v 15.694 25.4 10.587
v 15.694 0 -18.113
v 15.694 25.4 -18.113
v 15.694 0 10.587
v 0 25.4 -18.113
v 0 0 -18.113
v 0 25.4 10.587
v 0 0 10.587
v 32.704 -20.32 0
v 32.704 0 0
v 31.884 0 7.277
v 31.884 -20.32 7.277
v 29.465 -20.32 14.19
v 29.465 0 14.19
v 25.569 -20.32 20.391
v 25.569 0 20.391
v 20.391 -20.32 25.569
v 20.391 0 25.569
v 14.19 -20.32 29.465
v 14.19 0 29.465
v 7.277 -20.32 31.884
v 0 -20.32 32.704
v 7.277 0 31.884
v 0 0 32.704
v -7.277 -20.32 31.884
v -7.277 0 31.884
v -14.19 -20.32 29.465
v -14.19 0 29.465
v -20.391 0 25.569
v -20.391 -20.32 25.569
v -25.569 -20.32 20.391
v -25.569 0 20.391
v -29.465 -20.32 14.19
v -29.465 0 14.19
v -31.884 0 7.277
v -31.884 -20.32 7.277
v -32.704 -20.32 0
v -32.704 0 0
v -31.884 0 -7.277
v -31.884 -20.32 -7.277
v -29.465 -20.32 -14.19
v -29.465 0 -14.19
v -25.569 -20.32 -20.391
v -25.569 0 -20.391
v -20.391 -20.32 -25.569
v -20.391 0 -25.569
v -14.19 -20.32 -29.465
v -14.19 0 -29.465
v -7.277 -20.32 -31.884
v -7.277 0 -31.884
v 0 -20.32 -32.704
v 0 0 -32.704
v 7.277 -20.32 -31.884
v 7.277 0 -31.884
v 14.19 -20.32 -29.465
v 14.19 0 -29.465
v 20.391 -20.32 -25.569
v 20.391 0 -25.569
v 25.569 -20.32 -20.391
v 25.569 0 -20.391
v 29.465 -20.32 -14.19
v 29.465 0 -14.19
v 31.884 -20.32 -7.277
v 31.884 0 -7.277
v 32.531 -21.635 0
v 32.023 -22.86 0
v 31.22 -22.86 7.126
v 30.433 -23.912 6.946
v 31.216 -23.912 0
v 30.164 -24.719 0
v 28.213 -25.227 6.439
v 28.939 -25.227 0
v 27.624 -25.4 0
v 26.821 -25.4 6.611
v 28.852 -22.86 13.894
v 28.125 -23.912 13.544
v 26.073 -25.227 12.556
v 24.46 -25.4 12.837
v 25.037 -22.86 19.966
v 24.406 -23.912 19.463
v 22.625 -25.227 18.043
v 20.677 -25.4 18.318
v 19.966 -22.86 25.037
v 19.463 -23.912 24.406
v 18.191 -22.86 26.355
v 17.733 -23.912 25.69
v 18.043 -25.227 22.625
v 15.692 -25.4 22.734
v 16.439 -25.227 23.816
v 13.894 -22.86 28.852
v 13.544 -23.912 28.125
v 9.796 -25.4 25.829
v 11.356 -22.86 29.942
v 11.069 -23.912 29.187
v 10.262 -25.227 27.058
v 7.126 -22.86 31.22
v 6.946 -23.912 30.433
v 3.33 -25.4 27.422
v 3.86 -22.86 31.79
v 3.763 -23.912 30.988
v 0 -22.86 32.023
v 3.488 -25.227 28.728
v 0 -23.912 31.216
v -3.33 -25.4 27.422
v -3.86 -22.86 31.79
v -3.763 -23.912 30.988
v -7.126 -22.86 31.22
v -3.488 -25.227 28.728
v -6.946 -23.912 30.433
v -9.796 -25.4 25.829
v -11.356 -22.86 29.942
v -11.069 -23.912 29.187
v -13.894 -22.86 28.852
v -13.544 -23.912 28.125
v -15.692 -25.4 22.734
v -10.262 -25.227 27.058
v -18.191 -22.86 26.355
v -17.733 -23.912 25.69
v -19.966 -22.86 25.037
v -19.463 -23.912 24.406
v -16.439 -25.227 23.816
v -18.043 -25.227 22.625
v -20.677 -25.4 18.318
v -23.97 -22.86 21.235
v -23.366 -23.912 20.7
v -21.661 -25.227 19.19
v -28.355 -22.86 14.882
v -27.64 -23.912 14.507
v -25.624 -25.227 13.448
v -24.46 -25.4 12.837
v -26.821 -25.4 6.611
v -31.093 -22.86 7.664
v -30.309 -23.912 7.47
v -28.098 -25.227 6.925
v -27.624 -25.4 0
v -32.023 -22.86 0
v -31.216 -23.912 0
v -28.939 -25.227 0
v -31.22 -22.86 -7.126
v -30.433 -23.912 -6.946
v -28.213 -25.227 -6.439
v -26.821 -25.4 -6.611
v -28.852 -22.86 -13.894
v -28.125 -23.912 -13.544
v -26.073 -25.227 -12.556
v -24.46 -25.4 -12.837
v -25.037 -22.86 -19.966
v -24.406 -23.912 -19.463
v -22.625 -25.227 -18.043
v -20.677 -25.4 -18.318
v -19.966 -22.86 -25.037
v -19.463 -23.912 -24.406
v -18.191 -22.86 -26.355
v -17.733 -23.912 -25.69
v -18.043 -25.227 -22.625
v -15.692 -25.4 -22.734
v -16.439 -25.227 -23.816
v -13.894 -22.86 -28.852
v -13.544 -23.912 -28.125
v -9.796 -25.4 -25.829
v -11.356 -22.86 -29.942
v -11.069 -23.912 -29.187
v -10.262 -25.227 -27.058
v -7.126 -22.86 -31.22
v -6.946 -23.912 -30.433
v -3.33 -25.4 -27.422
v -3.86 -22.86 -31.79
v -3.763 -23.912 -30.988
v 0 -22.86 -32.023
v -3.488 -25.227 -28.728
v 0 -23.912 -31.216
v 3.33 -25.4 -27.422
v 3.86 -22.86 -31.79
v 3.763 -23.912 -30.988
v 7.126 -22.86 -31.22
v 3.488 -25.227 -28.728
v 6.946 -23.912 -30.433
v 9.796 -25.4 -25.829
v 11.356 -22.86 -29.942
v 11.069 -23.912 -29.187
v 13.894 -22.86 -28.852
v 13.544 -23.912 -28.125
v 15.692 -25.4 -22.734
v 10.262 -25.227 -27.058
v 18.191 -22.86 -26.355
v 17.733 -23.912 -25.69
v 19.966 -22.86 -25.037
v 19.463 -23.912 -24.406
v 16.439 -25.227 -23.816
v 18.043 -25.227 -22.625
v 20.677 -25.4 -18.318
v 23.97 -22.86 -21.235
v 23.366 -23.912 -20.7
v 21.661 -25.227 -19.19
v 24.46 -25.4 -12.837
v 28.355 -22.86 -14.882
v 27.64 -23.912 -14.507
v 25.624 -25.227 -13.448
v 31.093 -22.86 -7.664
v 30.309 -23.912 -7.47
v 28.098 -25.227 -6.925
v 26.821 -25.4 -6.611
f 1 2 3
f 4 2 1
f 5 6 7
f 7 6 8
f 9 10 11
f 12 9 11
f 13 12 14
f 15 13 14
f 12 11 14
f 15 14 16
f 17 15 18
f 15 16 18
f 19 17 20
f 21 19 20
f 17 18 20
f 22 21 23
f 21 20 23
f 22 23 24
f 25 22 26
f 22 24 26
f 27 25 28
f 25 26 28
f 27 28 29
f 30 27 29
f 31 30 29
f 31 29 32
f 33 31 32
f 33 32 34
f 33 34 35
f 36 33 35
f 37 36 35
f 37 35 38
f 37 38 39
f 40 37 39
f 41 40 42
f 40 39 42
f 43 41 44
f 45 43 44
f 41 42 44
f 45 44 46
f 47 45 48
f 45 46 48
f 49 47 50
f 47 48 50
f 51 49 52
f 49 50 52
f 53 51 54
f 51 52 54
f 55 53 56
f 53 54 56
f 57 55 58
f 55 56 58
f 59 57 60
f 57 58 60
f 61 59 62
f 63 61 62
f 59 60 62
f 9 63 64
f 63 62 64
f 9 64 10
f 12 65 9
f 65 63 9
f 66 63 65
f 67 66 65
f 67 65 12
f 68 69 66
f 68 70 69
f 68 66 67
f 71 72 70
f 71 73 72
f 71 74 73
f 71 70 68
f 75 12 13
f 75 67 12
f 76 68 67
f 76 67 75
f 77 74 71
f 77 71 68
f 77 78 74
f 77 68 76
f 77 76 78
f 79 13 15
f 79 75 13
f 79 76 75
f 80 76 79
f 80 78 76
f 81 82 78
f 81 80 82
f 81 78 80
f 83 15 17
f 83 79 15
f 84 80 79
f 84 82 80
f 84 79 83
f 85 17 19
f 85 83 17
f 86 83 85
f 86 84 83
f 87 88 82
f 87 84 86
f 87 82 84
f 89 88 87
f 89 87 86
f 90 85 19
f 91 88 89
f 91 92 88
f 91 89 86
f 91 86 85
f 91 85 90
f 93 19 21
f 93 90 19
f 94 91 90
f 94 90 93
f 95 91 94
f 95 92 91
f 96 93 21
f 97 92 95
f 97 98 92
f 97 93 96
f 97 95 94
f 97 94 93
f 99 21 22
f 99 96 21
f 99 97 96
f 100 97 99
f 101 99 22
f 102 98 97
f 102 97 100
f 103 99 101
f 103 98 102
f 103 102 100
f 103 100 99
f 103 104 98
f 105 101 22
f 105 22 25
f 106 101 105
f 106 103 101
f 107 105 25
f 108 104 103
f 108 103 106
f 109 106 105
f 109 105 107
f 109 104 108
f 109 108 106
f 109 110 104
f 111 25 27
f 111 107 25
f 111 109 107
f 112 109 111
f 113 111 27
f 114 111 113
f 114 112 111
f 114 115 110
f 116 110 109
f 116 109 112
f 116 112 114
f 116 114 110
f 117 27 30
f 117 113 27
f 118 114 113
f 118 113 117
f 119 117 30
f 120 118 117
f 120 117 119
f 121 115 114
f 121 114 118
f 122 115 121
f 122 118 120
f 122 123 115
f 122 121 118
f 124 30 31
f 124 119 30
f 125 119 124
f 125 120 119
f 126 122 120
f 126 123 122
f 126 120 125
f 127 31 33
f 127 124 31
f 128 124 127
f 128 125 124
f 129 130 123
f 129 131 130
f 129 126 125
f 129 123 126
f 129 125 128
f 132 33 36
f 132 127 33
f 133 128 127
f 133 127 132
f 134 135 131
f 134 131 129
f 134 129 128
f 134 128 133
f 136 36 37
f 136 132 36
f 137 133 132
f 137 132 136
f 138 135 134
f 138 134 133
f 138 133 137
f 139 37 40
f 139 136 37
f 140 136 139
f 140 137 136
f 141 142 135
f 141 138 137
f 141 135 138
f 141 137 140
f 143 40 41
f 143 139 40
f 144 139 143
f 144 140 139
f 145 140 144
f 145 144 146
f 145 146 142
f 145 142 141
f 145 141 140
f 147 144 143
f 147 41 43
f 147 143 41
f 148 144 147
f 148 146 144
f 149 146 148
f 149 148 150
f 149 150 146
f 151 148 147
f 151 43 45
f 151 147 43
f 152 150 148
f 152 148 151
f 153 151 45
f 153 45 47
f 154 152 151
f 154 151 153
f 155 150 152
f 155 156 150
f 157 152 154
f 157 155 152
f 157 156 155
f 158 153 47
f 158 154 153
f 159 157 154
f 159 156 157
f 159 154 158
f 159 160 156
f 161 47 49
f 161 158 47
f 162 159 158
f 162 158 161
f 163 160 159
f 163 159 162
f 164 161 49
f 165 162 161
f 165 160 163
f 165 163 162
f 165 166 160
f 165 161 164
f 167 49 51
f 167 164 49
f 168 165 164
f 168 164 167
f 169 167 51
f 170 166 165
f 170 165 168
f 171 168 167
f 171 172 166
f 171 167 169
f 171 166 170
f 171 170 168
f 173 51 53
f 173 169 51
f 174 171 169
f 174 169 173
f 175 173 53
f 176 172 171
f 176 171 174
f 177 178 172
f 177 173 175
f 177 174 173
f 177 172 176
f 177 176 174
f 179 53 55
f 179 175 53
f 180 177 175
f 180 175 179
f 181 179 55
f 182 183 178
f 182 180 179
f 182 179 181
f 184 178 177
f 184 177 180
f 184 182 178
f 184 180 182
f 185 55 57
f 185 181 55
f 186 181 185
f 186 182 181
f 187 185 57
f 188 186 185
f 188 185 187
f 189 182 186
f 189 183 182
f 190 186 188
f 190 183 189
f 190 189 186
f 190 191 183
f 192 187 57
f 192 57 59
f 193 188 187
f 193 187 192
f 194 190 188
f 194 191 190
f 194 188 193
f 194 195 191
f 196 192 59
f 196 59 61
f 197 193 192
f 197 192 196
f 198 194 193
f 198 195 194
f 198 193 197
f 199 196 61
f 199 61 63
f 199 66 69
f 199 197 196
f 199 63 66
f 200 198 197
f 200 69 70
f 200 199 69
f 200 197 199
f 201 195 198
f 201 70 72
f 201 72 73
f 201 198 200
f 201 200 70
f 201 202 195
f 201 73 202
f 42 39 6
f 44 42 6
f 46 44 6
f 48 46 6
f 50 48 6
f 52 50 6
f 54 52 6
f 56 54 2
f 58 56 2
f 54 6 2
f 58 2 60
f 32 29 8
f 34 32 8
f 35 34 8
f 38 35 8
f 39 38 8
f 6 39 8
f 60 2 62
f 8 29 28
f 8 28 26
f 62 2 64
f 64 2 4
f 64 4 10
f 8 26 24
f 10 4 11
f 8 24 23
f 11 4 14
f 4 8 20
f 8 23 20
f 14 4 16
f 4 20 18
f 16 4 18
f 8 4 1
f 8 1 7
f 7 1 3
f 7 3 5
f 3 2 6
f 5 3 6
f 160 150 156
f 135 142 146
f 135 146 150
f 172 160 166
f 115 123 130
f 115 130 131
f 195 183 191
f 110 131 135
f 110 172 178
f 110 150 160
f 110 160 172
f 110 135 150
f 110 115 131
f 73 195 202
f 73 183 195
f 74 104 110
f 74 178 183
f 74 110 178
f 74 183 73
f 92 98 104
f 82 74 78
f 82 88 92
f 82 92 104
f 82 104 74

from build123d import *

# Parameters (mm, degrees)
F0_R     = 32.703889
F1_DEPTH = 25.4
F2_R     = 5.08
F3_W     = 15.693672
F3_H     = 28.699555
F4_DEPTH = 25.4


with BuildPart() as f1:
    # F0 (on Front) → F1 (new body)
    with BuildSketch(Plane.XZ):
        Circle(F0_R)
    extrude(amount=F1_DEPTH)

    # F2
    f2_edges = [f1.edges().sort_by_distance(p)[0] for p in [
        (-32.703889, -25.4, 0),
    ]]
    fillet(f2_edges, radius=F2_R)

    # F3 (on face) → F4 (join)
    with BuildSketch(Plane(origin=(0, 0, 0), x_dir=(-1, 0, 0), z_dir=(0, 1, 0))):
        with Locations((-7.846836, -3.763053)):
            Rectangle(F3_W, F3_H)
    extrude(amount=F4_DEPTH)


solid = f1.part
